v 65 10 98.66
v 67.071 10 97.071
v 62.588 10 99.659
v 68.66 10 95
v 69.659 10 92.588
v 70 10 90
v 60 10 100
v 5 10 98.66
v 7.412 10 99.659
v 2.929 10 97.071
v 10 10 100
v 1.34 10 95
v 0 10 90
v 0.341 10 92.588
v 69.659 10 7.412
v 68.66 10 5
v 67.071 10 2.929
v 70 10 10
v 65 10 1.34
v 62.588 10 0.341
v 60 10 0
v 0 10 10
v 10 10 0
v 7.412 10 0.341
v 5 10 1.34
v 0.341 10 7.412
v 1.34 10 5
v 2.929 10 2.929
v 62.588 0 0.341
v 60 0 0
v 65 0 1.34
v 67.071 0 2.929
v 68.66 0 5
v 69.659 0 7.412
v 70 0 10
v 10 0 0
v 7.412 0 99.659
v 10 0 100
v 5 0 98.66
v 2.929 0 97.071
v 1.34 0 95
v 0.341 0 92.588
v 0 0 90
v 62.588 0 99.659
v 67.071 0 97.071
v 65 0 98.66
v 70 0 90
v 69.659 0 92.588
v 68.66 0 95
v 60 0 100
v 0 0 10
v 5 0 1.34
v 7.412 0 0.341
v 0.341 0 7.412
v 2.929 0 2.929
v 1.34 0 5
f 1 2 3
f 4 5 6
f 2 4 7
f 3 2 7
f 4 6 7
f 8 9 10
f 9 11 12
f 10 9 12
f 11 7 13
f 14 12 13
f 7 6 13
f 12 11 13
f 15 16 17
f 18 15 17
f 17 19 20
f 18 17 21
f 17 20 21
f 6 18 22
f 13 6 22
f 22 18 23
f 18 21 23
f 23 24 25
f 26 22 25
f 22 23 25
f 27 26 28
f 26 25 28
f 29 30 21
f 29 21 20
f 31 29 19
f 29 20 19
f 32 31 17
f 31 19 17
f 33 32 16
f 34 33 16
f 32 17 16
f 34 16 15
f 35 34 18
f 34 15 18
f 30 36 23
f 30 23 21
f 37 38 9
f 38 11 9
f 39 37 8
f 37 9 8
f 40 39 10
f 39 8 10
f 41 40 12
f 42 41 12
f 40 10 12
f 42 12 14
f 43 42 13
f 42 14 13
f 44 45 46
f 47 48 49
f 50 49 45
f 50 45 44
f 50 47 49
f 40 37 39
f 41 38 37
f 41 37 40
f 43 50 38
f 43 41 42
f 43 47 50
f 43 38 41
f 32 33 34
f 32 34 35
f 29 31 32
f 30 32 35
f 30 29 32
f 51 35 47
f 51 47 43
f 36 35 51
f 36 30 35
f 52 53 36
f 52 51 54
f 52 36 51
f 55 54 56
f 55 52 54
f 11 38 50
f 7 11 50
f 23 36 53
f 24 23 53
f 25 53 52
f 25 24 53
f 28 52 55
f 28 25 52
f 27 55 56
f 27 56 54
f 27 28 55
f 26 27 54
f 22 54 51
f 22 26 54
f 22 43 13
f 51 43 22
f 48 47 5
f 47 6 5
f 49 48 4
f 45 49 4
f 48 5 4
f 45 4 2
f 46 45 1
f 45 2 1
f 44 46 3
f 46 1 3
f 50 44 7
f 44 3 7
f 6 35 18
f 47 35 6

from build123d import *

# Parameters (mm, degrees)
BOSS_EXTRU_1_DEPTH = 10
CONG_2_R           = 10


with BuildPart() as part:
    # Esquisse1 → Boss.-Extru.1 (new body)
    with BuildSketch(Plane(origin=(0, 0, 0), x_dir=(1, 0, 0), z_dir=(0, 1, 0))):
        Polygon((0, 0), (70, 0), (70, -100), (40, -100), (30, -100), (0, -100), align=None)
    extrude(amount=BOSS_EXTRU_1_DEPTH)

    # Congé2
    cong_2_edges = [part.edges().sort_by_distance(p)[0] for p in [
        (0, 5, 0),
        (70, 5, 0),
        (70, 5, 100),
        (0, 5, 100),
    ]]
    fillet(cong_2_edges, radius=CONG_2_R)


solid = part.part
